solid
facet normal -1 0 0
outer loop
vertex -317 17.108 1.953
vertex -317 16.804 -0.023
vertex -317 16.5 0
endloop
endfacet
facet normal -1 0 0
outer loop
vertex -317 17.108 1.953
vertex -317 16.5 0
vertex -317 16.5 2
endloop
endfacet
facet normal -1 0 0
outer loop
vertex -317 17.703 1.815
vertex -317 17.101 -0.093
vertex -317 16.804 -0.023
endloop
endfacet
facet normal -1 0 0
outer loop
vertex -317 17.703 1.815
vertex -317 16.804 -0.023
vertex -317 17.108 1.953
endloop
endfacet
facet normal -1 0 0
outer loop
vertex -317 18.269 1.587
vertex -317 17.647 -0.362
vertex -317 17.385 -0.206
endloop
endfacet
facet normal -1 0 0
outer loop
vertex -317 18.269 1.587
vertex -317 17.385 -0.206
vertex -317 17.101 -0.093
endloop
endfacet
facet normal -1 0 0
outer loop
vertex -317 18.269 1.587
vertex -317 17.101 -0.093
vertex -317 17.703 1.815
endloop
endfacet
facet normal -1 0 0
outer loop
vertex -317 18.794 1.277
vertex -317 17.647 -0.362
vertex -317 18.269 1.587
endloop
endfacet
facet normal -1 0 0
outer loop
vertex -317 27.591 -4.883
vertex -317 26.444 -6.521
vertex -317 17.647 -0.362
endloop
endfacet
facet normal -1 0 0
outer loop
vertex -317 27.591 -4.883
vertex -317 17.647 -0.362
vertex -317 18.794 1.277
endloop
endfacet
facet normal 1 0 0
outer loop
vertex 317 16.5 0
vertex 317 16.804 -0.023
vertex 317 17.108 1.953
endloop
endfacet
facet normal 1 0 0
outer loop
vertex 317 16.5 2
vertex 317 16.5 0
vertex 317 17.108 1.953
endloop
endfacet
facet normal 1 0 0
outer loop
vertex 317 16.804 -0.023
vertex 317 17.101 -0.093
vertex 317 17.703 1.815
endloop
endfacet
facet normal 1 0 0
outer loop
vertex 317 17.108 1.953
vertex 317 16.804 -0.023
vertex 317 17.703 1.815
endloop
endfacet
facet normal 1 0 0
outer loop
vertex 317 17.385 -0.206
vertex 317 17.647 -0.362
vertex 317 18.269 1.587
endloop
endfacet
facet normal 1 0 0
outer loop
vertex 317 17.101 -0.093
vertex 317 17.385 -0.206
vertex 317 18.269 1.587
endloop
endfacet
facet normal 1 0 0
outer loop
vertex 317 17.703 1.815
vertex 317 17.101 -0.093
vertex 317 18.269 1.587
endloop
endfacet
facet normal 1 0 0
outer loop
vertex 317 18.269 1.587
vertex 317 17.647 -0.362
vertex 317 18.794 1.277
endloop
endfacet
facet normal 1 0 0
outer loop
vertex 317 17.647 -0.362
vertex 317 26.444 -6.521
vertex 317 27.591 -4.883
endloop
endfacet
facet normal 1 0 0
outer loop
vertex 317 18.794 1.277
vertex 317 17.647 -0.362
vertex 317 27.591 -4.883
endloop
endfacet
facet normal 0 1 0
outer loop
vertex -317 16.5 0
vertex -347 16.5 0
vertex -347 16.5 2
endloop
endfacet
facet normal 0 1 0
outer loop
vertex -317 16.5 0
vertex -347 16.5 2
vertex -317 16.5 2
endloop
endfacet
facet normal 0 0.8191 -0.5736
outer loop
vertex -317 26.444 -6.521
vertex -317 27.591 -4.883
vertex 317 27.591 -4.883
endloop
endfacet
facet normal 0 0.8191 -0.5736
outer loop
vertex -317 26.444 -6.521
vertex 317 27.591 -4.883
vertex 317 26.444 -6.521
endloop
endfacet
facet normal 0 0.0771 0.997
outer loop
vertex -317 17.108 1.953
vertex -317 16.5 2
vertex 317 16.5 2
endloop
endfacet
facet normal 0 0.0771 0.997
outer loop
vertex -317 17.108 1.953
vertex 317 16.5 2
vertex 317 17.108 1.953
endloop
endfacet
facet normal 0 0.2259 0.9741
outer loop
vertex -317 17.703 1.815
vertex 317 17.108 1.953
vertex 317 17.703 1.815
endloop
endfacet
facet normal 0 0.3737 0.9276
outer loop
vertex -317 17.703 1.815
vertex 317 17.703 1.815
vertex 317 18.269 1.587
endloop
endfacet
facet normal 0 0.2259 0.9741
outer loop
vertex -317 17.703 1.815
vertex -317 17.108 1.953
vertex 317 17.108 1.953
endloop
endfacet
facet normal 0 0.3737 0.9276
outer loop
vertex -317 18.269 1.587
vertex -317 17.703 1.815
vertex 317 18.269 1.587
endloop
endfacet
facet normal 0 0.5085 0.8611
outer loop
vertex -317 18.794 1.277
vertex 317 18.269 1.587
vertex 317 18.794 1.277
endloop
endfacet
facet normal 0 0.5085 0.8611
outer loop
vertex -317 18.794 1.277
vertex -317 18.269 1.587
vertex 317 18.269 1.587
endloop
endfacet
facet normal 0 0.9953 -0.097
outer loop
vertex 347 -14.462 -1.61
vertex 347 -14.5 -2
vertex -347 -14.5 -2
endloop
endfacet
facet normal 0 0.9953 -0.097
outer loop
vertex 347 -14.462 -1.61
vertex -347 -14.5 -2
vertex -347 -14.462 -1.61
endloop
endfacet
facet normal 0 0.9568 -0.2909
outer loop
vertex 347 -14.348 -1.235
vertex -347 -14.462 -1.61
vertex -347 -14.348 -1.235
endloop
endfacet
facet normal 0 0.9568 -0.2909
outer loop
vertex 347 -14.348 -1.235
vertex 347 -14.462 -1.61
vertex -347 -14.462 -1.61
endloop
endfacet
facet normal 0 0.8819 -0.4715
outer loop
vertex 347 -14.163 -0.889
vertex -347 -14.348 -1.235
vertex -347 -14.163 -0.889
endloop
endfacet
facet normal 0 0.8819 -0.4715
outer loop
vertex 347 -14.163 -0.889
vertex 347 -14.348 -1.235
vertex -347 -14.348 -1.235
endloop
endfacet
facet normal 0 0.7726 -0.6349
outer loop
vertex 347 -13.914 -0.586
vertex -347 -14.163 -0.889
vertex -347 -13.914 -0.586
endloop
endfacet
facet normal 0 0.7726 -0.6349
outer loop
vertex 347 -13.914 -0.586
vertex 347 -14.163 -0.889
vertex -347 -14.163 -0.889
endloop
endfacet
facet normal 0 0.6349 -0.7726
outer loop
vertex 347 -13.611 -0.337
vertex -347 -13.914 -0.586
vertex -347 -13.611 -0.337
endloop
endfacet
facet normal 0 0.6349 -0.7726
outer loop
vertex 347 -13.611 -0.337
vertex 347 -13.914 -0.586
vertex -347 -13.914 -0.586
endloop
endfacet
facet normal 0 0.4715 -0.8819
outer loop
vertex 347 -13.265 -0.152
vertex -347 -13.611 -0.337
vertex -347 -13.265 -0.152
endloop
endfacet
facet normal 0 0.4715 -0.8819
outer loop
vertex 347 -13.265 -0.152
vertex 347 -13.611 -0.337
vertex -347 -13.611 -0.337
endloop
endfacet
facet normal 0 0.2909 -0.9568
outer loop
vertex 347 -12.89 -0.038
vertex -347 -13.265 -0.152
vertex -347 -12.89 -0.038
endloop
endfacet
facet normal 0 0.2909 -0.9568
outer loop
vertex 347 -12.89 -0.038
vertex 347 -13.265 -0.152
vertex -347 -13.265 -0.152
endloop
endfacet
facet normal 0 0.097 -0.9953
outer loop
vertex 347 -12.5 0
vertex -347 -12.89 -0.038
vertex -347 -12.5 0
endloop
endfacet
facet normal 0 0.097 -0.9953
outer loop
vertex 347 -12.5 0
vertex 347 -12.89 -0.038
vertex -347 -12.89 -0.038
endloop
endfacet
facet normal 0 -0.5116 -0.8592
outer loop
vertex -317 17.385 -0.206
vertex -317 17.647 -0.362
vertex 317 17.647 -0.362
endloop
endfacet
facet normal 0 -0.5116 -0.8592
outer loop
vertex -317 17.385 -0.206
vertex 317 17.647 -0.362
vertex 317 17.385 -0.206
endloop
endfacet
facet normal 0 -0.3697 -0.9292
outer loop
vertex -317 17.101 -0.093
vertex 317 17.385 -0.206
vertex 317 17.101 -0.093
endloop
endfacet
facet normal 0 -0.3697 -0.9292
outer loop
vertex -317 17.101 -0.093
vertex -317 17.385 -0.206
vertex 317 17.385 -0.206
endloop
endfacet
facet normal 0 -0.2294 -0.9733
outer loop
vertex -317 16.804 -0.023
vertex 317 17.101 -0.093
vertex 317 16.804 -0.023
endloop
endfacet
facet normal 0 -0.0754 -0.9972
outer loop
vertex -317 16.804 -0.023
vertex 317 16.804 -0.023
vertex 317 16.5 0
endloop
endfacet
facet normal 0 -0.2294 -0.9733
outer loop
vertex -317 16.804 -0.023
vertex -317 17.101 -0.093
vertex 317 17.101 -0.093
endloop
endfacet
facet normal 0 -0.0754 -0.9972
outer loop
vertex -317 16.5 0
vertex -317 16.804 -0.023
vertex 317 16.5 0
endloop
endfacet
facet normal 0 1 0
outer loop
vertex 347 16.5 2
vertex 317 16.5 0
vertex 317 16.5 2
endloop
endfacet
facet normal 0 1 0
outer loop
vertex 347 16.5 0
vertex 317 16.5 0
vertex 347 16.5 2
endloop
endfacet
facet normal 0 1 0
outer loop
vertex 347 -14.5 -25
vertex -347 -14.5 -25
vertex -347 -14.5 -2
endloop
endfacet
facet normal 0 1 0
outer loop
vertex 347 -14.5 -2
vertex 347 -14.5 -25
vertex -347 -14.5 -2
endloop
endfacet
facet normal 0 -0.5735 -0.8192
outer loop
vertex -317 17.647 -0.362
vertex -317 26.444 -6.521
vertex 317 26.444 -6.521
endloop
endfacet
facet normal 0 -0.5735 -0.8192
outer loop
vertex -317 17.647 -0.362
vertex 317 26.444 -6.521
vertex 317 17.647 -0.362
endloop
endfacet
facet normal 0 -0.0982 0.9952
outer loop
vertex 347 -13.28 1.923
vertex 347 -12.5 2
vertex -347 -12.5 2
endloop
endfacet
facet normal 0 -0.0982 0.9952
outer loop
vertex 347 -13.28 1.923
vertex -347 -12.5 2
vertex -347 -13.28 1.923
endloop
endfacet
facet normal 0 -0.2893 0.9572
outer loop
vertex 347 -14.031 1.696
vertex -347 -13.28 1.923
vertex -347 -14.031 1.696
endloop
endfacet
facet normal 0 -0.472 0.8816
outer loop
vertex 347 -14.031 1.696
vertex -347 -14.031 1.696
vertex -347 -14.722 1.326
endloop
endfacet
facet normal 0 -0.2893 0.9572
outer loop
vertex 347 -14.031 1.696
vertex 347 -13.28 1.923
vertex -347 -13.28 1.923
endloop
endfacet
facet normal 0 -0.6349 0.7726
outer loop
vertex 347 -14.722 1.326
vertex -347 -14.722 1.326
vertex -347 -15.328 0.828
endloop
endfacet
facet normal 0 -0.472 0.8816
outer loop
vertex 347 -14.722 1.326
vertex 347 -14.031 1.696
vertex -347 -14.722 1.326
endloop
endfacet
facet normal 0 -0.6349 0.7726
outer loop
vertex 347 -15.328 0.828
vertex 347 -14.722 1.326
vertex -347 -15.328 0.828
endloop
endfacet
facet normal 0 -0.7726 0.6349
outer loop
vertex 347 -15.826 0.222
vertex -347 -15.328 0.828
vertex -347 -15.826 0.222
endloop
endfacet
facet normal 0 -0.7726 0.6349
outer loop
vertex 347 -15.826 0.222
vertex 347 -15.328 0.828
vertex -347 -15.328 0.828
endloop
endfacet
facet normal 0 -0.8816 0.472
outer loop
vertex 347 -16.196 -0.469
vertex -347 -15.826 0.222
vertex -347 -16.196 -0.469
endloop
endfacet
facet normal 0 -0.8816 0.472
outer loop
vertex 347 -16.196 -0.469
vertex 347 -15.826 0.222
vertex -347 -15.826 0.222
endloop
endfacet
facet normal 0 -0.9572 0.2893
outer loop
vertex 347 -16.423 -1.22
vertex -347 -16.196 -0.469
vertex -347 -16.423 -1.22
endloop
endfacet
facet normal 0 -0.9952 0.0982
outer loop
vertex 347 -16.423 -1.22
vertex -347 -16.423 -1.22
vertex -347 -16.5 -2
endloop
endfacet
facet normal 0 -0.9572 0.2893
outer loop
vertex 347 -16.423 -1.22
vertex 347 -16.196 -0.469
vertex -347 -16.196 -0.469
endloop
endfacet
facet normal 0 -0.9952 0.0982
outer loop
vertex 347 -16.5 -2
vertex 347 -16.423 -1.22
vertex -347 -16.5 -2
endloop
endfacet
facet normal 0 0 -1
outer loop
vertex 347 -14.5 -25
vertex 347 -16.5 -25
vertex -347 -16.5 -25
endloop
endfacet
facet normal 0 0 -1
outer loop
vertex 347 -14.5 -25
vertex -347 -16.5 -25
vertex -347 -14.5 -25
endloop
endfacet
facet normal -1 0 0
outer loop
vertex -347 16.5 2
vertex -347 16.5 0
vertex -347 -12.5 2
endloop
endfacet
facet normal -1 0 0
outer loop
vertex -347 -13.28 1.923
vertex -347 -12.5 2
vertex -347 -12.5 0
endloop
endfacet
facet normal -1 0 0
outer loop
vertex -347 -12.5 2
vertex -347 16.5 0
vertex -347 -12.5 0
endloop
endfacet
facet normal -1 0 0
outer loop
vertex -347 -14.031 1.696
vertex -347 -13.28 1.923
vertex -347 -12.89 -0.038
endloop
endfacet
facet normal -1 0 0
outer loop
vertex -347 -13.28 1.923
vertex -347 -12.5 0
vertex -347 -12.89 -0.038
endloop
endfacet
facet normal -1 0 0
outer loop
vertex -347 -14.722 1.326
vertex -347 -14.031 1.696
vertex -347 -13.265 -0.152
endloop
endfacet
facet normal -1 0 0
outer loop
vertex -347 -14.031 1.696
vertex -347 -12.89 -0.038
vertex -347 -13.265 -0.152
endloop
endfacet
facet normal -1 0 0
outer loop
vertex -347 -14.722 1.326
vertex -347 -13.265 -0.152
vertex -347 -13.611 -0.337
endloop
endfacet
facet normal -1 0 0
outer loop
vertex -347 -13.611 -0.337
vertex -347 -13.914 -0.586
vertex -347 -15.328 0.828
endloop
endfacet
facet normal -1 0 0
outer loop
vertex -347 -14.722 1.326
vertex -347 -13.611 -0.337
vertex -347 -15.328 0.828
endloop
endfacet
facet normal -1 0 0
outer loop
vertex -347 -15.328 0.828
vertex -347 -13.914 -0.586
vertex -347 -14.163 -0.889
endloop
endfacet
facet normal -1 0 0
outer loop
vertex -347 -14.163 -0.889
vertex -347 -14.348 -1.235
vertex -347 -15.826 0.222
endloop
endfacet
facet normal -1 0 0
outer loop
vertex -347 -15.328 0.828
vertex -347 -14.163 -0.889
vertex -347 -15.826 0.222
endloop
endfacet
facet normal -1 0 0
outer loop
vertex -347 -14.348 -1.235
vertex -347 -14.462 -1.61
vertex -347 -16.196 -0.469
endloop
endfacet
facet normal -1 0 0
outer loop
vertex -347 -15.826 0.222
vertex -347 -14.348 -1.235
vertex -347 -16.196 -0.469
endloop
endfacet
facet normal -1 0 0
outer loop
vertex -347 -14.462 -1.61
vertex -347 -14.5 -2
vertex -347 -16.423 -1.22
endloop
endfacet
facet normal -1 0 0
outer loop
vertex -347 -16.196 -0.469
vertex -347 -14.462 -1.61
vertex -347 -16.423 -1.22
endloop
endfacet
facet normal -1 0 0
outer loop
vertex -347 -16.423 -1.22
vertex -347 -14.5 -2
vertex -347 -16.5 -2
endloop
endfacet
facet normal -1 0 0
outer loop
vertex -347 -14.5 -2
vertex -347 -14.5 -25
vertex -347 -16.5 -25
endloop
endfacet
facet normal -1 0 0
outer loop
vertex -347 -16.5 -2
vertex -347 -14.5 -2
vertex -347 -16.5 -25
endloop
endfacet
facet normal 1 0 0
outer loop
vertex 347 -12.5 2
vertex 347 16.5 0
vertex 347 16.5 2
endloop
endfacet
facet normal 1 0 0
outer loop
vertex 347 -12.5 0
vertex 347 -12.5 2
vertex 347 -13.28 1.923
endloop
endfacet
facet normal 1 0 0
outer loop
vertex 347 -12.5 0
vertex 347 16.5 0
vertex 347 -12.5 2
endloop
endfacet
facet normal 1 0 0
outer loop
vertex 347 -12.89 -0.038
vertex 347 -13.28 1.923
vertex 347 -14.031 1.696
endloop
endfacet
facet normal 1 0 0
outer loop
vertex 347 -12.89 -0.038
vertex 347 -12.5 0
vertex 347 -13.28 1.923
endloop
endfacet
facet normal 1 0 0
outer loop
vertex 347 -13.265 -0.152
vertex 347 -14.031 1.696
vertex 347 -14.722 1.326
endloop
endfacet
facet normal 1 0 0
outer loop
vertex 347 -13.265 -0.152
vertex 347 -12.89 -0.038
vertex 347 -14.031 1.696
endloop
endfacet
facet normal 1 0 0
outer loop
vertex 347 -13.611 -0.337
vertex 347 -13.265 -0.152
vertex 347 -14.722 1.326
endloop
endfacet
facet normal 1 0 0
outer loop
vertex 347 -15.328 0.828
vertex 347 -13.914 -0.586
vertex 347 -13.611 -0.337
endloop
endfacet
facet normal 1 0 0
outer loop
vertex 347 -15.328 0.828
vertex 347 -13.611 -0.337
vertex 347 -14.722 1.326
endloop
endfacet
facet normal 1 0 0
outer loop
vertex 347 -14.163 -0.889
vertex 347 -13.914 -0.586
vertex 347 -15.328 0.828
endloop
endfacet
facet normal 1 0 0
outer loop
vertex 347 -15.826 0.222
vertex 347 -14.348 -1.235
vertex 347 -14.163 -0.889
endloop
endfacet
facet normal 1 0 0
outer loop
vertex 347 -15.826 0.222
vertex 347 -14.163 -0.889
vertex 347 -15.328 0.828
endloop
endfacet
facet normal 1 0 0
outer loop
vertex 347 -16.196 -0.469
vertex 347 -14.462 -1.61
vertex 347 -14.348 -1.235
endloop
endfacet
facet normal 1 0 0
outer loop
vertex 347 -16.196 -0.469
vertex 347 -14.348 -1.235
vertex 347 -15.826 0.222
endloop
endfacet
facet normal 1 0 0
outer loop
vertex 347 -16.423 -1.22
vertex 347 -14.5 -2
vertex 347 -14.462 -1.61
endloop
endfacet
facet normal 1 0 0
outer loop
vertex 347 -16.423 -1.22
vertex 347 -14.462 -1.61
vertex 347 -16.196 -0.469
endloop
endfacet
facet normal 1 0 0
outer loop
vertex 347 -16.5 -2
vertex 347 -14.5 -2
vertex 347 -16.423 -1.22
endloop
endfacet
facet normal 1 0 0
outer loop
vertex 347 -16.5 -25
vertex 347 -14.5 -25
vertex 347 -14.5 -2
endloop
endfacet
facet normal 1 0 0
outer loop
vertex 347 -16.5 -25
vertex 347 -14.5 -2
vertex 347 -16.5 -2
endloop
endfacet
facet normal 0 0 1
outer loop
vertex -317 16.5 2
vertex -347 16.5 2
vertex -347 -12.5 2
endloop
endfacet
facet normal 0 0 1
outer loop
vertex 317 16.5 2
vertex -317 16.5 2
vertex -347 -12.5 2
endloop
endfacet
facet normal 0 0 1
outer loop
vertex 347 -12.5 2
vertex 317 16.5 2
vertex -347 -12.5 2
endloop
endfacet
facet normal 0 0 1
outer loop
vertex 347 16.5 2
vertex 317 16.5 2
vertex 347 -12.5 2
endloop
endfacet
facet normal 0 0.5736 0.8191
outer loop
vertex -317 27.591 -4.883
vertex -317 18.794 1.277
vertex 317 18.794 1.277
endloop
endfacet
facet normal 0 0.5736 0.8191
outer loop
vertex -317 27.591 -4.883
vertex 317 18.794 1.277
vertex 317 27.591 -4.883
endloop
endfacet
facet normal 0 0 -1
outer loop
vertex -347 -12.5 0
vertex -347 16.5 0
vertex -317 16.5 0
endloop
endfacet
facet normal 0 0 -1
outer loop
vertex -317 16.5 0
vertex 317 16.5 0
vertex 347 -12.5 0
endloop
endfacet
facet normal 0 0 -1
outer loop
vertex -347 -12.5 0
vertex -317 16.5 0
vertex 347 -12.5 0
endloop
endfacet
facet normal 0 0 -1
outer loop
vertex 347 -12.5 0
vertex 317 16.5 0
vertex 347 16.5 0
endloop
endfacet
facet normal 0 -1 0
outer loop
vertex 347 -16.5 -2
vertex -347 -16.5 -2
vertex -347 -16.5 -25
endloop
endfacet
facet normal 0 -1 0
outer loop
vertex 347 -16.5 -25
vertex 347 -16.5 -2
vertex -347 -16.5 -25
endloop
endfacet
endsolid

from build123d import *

# Parameters (mm, degrees)
SKETCH1_W                    = 694
SKETCH1_H                    = 33
BASE_FLANGE1_DEPTH           = 2
EDGE_FLANGE1_STRIP_W         = 12
EDGE_FLANGE1_STRIP_H         = 2
EDGE_FLANGE1_STRIP_CUT_DEPTH = 694
EDGE_FLANGE1_DEPTH           = 694
EDGE_FLANGE2_DEPTH           = 634


# Sheet-metal steps are written as plain solids
with BuildPart() as part:
    # Sketch1 → Base-Flange1 (new body)
    with BuildSketch(Plane.XY):
        Rectangle(SKETCH1_W, SKETCH1_H)
    extrude(amount=BASE_FLANGE1_DEPTH)

    # Edge-Flange1 strip (across the edge) → Edge-Flange1 strip cut (cut)
    with BuildSketch(Plane(origin=(347, -16.5, 0), x_dir=(0, 1, 0), z_dir=(-1, 0, 0))):
        with Locations((-2, -1)):
            Rectangle(EDGE_FLANGE1_STRIP_W, EDGE_FLANGE1_STRIP_H)
    extrude(amount=EDGE_FLANGE1_STRIP_CUT_DEPTH, mode=Mode.SUBTRACT)

    # Edge-Flange1 section (across the edge) → Edge-Flange1 (add)
    with BuildSketch(Plane(origin=(347, -16.5, 0), x_dir=(0, 1, 0), z_dir=(-1, 0, 0))):
        with BuildLine():
            Line((0, 2), (0, 25))
            Line((0, 25), (2, 25))
            Line((2, 25), (2, 2))
            ThreePointArc((2, 2), (2.585786438, 0.585786438), (4, 0))
            Line((4, 0), (4, -2))
            ThreePointArc((4, -2), (1.171572875, -0.828427125), (0, 2))
        make_face()
    extrude(amount=EDGE_FLANGE1_DEPTH)

    # Edge-Flange2 section (across the edge) → Edge-Flange2 (add)
    with BuildSketch(Plane(origin=(-317, 17.130597578, 0), x_dir=(0, -0.5735764363510416, -0.8191520442889949), z_dir=(1, 0, 0))):
        with BuildLine():
            Line((-2, 0.630597578), (-2, 11.369402422))
            Line((-2, 11.369402422), (0, 11.369402422))
            Line((0, 11.369402422), (0, 0.630597578))
            ThreePointArc((0, 0.630597578), (0.092566099, 0.029185979), (0.361695911, -0.516555295))
            Line((0.361695911, -0.516555295), (-1.276608177, -1.663708168))
            ThreePointArc((-1.276608177, -1.663708168), (-1.814867803, -0.57222562), (-2, 0.630597578))
        make_face()
    extrude(amount=EDGE_FLANGE2_DEPTH)


solid = part.part
